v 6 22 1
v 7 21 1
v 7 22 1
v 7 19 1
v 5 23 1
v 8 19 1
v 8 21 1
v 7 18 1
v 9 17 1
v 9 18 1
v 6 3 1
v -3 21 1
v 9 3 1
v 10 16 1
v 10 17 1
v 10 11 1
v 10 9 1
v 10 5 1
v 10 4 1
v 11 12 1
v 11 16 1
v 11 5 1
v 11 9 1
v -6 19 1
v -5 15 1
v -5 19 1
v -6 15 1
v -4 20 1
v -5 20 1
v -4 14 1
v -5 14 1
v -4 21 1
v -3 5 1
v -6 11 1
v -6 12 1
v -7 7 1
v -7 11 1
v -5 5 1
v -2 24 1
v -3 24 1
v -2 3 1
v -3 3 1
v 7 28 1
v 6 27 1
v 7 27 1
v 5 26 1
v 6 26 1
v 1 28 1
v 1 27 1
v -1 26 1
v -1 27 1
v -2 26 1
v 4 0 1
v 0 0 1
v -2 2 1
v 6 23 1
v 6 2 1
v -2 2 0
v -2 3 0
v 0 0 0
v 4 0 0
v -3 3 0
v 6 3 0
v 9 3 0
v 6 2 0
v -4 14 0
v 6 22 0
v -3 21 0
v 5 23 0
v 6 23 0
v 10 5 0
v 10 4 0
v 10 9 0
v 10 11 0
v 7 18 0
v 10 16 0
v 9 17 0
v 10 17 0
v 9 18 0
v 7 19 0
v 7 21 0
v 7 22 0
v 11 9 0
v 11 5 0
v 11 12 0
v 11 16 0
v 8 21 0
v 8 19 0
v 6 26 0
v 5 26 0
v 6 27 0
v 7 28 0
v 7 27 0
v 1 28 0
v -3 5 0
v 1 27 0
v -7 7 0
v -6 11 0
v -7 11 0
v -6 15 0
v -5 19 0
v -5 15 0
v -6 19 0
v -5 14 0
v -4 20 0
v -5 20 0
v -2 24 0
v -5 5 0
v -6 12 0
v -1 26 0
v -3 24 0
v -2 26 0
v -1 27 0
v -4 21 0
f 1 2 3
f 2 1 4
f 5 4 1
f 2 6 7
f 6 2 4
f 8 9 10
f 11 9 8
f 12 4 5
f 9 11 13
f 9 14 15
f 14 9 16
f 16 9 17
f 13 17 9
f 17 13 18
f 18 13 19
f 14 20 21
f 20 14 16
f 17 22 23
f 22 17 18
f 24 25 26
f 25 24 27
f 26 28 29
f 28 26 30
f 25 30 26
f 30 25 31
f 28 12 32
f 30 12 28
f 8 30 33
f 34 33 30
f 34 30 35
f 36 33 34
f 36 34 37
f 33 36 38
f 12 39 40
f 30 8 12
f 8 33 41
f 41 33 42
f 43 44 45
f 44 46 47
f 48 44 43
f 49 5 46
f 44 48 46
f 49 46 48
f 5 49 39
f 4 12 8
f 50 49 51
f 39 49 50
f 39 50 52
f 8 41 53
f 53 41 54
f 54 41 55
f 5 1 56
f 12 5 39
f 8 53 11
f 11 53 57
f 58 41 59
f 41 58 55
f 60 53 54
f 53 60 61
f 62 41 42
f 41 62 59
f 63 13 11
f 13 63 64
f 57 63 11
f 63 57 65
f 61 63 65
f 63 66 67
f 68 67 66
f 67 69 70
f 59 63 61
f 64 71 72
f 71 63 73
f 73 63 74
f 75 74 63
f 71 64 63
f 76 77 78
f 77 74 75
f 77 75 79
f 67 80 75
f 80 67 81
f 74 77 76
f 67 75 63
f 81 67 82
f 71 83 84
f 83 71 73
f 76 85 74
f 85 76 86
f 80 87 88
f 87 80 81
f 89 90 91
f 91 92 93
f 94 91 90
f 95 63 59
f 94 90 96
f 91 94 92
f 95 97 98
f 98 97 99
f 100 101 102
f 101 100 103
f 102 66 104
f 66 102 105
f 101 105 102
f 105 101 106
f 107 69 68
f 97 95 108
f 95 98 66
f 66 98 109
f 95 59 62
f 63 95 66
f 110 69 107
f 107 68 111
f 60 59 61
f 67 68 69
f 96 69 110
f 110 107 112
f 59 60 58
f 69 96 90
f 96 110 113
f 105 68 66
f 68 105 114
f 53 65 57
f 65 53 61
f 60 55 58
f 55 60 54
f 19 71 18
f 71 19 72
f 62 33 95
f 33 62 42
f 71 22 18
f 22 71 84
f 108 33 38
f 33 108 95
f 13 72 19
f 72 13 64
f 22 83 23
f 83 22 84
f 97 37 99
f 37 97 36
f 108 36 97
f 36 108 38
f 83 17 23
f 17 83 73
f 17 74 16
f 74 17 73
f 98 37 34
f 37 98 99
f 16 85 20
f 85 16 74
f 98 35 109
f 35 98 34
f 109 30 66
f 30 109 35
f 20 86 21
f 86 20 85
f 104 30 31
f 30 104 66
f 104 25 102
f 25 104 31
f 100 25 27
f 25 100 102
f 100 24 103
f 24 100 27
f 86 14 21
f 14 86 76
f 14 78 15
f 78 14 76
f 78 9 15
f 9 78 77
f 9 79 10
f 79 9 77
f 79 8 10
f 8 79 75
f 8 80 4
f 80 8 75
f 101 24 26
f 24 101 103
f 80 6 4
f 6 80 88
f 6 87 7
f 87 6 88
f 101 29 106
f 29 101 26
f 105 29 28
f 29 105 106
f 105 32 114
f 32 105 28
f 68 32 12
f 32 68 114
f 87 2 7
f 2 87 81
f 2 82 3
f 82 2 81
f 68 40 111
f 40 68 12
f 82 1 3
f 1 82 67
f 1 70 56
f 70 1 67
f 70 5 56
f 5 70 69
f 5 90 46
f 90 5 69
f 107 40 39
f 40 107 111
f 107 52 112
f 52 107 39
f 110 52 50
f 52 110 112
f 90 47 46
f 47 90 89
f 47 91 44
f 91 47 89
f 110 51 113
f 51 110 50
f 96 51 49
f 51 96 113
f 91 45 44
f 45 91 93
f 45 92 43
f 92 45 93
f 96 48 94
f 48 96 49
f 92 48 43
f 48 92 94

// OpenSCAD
module pixels() {
{
hull() {
cube([4,1,1]);
translate([-1,1,0]) cube([6,1,1]);
translate([-2,2,0]) cube([8,1,1]);
}

hull() {
translate([-3,3,0]) cube([12,1,1]); 
translate([-3,4,0]) cube([13,1,1]);
}

hull() {
translate([-5,5,0]) cube([16,1,1]);
translate([-6,6,0]) cube([17,1,1]);
translate([-7,7,0]) cube([18,1,1]);
}

translate([-7,8,0]) cube([18,1,1]);
translate([-7,9,0]) cube([17,1,1]);
translate([-7,10,0]) cube([17,1,1]);

hull() {

translate([-6,11,0]) cube([16,1,1]);
translate([-5,12,0]) cube([16,1,1]);
translate([-4,13,0]) cube([15,1,1]);
}
  
translate([-5,14,0]) cube([16,1,1]);
translate([-6,15,0]) cube([17,1,1]);
translate([-6,16,0]) cube([16,1,1]);
translate([-6,17,0]) cube([15,1,1]);
translate([-6,18,0]) cube([13,1,1]);
translate([-5,19,0]) cube([13,1,1]);
translate([-4,20,0]) cube([12,1,1]);
translate([-3,21,0]) cube([10,1,1]);

translate([-3,22,0]) cube([9,1,1]);
translate([-3,23,0]) cube([8,1,1]);
translate([-2,24,0]) cube([7,1,1]);
translate([-2,25,0]) cube([7,1,1]);
translate([-1,26,0]) cube([7,1,1]);
translate([1,27,0]) cube([6,1,1]);
};
}

pixels();
